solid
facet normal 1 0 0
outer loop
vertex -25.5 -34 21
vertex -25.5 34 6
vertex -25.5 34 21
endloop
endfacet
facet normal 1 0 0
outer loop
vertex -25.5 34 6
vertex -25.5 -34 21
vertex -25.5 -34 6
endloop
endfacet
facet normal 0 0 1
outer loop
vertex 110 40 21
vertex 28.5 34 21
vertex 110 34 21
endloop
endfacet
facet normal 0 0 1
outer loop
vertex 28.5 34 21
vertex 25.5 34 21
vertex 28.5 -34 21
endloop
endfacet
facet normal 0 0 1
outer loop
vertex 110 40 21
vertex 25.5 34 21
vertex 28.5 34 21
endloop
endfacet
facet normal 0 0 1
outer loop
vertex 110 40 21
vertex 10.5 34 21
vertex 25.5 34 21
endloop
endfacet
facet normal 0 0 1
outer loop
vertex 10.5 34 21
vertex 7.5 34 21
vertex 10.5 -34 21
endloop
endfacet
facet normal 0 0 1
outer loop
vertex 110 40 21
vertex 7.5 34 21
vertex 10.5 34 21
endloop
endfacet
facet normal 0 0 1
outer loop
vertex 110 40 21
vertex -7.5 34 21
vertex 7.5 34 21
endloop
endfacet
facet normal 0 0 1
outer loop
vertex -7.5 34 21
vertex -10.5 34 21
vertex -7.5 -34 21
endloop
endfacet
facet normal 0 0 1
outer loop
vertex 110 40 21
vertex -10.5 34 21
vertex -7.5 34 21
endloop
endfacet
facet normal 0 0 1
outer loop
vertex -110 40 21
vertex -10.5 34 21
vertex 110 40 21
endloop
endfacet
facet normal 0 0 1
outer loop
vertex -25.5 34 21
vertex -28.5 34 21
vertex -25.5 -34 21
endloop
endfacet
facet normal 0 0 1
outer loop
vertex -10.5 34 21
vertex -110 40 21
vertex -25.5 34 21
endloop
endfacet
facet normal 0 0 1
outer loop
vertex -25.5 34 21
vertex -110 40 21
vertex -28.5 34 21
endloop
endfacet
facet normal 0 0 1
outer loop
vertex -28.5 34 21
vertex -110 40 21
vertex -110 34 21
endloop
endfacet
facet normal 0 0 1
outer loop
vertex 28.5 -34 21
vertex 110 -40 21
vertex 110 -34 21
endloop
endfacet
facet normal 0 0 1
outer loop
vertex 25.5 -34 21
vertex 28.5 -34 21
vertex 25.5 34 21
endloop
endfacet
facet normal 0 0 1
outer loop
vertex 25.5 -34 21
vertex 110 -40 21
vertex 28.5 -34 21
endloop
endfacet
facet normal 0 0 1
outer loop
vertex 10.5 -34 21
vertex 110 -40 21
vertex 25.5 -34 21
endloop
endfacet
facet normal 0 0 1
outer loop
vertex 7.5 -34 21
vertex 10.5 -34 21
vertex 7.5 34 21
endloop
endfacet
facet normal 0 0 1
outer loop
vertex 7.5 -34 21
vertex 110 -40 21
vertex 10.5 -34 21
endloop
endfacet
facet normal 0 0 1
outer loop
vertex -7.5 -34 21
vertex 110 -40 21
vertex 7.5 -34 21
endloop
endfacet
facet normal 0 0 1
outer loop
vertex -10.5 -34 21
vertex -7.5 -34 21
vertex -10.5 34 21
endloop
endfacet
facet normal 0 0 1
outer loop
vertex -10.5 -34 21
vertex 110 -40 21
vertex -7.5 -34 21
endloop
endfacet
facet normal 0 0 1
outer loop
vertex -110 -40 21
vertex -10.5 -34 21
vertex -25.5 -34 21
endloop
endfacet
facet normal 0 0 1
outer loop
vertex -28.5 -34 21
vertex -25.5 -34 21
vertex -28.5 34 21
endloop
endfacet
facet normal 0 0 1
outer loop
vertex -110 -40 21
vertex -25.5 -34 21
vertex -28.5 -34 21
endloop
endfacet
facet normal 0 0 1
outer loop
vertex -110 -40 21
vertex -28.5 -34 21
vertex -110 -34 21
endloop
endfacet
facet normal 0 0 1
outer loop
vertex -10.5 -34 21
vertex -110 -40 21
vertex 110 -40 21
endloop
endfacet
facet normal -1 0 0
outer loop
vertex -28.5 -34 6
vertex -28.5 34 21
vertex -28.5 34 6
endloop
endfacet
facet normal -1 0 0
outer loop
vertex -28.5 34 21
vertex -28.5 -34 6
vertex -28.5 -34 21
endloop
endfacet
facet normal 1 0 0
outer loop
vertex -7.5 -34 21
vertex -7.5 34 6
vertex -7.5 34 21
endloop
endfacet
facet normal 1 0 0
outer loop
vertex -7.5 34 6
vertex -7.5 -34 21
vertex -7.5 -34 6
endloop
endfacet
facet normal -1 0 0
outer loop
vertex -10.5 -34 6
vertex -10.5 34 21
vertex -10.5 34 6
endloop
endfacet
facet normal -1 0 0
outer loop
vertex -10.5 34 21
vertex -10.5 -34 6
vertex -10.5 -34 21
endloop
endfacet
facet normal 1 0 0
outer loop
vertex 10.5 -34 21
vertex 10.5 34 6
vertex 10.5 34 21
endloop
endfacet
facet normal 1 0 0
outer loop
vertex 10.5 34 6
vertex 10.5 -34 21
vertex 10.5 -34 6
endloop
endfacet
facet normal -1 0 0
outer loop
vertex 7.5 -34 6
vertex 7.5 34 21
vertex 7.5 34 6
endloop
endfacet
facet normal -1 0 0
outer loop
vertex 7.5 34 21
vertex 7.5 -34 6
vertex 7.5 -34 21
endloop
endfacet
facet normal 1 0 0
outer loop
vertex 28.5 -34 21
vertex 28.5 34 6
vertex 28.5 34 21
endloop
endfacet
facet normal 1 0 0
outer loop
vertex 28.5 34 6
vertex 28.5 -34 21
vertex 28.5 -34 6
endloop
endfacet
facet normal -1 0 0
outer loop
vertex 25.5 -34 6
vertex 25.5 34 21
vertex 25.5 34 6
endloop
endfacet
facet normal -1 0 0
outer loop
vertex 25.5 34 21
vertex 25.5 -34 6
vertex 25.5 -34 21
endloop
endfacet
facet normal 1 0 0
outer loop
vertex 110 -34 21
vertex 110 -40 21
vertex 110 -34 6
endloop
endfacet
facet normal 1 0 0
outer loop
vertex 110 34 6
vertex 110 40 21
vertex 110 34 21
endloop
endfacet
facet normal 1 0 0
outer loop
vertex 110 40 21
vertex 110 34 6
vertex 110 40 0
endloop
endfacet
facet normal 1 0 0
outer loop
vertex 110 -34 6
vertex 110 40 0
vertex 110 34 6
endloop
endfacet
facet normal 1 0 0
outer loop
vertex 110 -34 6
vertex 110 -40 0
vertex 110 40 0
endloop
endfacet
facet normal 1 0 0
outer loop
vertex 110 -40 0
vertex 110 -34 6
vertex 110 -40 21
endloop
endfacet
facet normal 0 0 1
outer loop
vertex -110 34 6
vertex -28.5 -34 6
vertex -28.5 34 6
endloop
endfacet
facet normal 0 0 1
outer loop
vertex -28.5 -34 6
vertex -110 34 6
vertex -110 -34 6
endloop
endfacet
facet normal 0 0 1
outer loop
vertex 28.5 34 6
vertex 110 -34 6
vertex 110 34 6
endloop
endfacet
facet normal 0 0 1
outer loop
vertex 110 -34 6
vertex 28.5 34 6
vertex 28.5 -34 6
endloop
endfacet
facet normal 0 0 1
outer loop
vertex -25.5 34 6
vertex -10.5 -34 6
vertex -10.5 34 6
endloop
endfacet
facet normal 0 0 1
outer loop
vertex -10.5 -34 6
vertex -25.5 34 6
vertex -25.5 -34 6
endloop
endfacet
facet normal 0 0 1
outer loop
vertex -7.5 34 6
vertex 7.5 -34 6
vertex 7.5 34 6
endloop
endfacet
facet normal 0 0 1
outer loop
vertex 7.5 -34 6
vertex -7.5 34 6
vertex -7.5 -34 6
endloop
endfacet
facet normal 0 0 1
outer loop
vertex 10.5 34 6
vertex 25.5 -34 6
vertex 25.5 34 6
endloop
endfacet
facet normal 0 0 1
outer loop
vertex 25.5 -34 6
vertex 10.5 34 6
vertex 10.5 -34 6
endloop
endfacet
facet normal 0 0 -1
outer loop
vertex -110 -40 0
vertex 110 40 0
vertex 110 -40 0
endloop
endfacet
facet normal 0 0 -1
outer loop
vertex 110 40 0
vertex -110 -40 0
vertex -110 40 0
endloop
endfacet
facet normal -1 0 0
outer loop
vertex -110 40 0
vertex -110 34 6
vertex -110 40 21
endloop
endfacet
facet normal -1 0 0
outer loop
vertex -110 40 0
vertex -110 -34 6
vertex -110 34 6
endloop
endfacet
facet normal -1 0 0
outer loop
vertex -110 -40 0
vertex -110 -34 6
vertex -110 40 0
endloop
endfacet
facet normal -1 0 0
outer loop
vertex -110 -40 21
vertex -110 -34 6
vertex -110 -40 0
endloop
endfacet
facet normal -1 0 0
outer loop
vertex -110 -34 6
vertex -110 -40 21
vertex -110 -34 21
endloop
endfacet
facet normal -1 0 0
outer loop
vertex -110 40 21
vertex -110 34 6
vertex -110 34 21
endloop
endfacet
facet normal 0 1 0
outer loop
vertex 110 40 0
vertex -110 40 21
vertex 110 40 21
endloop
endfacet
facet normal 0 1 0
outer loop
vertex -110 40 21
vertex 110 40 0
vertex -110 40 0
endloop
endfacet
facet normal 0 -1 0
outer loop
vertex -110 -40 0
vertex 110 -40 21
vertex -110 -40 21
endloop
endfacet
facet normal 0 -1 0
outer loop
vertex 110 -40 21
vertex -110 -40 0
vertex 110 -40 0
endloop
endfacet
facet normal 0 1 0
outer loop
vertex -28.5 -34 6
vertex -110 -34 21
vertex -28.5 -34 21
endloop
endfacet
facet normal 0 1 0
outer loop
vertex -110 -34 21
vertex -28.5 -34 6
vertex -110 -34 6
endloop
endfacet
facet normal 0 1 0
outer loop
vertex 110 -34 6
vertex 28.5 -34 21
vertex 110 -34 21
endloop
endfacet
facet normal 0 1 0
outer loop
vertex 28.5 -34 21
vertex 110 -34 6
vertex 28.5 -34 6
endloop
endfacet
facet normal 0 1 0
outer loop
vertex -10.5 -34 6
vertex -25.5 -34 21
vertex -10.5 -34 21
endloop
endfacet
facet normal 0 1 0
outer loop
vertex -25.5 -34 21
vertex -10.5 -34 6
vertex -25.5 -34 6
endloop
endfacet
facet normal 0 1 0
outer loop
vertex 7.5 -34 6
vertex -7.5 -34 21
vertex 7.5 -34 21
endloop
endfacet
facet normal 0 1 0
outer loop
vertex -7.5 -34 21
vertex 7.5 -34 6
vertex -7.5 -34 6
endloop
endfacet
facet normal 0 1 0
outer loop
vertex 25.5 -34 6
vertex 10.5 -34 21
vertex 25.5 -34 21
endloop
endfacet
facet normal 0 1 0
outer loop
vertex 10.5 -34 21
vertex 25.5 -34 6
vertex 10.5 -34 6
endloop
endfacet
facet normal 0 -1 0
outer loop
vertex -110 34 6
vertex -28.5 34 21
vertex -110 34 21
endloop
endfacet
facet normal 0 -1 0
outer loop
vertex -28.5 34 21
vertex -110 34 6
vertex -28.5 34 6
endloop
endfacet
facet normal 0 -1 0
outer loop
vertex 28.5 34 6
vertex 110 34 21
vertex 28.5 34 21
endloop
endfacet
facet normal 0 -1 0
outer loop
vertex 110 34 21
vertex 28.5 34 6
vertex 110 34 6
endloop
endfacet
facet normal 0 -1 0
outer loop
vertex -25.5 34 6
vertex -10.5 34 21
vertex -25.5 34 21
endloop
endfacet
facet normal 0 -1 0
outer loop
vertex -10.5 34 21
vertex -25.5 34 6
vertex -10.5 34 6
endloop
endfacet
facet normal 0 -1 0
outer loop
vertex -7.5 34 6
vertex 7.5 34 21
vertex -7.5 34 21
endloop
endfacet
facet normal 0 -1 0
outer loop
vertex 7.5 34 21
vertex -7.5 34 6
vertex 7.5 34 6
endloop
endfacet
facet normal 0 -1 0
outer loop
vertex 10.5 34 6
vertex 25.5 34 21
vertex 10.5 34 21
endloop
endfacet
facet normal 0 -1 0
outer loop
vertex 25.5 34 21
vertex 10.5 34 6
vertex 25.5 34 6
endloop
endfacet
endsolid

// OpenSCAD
$fn = 32;

// ----------------------------------------------------------------------
// Rib frame 220 x 80 x 21
// 4 ribs at 18 mm pitch
// ----------------------------------------------------------------------

// --- parameters (mm) ---
frame = [220, 80, 6];  // base plate size (x, y, z)
rail_w = 6;            // side rail width
ribs = 4;              // number of ribs
rib_t = 3;             // rib thickness
rib_h = 15;            // rib height above the base plate
pitch = 18;            // pitch between rib centres

// --- derived feature positions (mm) ---
span = (ribs - 1) * pitch;          // = 54   distance between the outer ribs
origin_x = -span / 2;               // = -27   X of the first rib
rib_len = frame[1] - 2 * rail_w + 2;  // = 70   rib length, 1 mm into each rail
feature_centers = [
  [origin_x + 0 * pitch, 0],
  [origin_x + 1 * pitch, 0],
  [origin_x + 2 * pitch, 0],
  [origin_x + 3 * pitch, 0]
];   // rib centre line, drives the rib loop

// base plate, two side rails, then the ribs read straight off feature_centers
union() {
  translate([-frame[0] / 2, -frame[1] / 2, 0]) cube(frame);
  translate([-frame[0] / 2, -frame[1] / 2, 0]) cube([frame[0], rail_w, frame[2] + rib_h]);
  translate([-frame[0] / 2, frame[1] / 2 - rail_w, 0]) cube([frame[0], rail_w, frame[2] + rib_h]);
  for (centre = feature_centers)
    translate([centre[0] - rib_t / 2, centre[1] - rib_len / 2, frame[2] - 1])
      cube([rib_t, rib_len, rib_h + 1]);
}
